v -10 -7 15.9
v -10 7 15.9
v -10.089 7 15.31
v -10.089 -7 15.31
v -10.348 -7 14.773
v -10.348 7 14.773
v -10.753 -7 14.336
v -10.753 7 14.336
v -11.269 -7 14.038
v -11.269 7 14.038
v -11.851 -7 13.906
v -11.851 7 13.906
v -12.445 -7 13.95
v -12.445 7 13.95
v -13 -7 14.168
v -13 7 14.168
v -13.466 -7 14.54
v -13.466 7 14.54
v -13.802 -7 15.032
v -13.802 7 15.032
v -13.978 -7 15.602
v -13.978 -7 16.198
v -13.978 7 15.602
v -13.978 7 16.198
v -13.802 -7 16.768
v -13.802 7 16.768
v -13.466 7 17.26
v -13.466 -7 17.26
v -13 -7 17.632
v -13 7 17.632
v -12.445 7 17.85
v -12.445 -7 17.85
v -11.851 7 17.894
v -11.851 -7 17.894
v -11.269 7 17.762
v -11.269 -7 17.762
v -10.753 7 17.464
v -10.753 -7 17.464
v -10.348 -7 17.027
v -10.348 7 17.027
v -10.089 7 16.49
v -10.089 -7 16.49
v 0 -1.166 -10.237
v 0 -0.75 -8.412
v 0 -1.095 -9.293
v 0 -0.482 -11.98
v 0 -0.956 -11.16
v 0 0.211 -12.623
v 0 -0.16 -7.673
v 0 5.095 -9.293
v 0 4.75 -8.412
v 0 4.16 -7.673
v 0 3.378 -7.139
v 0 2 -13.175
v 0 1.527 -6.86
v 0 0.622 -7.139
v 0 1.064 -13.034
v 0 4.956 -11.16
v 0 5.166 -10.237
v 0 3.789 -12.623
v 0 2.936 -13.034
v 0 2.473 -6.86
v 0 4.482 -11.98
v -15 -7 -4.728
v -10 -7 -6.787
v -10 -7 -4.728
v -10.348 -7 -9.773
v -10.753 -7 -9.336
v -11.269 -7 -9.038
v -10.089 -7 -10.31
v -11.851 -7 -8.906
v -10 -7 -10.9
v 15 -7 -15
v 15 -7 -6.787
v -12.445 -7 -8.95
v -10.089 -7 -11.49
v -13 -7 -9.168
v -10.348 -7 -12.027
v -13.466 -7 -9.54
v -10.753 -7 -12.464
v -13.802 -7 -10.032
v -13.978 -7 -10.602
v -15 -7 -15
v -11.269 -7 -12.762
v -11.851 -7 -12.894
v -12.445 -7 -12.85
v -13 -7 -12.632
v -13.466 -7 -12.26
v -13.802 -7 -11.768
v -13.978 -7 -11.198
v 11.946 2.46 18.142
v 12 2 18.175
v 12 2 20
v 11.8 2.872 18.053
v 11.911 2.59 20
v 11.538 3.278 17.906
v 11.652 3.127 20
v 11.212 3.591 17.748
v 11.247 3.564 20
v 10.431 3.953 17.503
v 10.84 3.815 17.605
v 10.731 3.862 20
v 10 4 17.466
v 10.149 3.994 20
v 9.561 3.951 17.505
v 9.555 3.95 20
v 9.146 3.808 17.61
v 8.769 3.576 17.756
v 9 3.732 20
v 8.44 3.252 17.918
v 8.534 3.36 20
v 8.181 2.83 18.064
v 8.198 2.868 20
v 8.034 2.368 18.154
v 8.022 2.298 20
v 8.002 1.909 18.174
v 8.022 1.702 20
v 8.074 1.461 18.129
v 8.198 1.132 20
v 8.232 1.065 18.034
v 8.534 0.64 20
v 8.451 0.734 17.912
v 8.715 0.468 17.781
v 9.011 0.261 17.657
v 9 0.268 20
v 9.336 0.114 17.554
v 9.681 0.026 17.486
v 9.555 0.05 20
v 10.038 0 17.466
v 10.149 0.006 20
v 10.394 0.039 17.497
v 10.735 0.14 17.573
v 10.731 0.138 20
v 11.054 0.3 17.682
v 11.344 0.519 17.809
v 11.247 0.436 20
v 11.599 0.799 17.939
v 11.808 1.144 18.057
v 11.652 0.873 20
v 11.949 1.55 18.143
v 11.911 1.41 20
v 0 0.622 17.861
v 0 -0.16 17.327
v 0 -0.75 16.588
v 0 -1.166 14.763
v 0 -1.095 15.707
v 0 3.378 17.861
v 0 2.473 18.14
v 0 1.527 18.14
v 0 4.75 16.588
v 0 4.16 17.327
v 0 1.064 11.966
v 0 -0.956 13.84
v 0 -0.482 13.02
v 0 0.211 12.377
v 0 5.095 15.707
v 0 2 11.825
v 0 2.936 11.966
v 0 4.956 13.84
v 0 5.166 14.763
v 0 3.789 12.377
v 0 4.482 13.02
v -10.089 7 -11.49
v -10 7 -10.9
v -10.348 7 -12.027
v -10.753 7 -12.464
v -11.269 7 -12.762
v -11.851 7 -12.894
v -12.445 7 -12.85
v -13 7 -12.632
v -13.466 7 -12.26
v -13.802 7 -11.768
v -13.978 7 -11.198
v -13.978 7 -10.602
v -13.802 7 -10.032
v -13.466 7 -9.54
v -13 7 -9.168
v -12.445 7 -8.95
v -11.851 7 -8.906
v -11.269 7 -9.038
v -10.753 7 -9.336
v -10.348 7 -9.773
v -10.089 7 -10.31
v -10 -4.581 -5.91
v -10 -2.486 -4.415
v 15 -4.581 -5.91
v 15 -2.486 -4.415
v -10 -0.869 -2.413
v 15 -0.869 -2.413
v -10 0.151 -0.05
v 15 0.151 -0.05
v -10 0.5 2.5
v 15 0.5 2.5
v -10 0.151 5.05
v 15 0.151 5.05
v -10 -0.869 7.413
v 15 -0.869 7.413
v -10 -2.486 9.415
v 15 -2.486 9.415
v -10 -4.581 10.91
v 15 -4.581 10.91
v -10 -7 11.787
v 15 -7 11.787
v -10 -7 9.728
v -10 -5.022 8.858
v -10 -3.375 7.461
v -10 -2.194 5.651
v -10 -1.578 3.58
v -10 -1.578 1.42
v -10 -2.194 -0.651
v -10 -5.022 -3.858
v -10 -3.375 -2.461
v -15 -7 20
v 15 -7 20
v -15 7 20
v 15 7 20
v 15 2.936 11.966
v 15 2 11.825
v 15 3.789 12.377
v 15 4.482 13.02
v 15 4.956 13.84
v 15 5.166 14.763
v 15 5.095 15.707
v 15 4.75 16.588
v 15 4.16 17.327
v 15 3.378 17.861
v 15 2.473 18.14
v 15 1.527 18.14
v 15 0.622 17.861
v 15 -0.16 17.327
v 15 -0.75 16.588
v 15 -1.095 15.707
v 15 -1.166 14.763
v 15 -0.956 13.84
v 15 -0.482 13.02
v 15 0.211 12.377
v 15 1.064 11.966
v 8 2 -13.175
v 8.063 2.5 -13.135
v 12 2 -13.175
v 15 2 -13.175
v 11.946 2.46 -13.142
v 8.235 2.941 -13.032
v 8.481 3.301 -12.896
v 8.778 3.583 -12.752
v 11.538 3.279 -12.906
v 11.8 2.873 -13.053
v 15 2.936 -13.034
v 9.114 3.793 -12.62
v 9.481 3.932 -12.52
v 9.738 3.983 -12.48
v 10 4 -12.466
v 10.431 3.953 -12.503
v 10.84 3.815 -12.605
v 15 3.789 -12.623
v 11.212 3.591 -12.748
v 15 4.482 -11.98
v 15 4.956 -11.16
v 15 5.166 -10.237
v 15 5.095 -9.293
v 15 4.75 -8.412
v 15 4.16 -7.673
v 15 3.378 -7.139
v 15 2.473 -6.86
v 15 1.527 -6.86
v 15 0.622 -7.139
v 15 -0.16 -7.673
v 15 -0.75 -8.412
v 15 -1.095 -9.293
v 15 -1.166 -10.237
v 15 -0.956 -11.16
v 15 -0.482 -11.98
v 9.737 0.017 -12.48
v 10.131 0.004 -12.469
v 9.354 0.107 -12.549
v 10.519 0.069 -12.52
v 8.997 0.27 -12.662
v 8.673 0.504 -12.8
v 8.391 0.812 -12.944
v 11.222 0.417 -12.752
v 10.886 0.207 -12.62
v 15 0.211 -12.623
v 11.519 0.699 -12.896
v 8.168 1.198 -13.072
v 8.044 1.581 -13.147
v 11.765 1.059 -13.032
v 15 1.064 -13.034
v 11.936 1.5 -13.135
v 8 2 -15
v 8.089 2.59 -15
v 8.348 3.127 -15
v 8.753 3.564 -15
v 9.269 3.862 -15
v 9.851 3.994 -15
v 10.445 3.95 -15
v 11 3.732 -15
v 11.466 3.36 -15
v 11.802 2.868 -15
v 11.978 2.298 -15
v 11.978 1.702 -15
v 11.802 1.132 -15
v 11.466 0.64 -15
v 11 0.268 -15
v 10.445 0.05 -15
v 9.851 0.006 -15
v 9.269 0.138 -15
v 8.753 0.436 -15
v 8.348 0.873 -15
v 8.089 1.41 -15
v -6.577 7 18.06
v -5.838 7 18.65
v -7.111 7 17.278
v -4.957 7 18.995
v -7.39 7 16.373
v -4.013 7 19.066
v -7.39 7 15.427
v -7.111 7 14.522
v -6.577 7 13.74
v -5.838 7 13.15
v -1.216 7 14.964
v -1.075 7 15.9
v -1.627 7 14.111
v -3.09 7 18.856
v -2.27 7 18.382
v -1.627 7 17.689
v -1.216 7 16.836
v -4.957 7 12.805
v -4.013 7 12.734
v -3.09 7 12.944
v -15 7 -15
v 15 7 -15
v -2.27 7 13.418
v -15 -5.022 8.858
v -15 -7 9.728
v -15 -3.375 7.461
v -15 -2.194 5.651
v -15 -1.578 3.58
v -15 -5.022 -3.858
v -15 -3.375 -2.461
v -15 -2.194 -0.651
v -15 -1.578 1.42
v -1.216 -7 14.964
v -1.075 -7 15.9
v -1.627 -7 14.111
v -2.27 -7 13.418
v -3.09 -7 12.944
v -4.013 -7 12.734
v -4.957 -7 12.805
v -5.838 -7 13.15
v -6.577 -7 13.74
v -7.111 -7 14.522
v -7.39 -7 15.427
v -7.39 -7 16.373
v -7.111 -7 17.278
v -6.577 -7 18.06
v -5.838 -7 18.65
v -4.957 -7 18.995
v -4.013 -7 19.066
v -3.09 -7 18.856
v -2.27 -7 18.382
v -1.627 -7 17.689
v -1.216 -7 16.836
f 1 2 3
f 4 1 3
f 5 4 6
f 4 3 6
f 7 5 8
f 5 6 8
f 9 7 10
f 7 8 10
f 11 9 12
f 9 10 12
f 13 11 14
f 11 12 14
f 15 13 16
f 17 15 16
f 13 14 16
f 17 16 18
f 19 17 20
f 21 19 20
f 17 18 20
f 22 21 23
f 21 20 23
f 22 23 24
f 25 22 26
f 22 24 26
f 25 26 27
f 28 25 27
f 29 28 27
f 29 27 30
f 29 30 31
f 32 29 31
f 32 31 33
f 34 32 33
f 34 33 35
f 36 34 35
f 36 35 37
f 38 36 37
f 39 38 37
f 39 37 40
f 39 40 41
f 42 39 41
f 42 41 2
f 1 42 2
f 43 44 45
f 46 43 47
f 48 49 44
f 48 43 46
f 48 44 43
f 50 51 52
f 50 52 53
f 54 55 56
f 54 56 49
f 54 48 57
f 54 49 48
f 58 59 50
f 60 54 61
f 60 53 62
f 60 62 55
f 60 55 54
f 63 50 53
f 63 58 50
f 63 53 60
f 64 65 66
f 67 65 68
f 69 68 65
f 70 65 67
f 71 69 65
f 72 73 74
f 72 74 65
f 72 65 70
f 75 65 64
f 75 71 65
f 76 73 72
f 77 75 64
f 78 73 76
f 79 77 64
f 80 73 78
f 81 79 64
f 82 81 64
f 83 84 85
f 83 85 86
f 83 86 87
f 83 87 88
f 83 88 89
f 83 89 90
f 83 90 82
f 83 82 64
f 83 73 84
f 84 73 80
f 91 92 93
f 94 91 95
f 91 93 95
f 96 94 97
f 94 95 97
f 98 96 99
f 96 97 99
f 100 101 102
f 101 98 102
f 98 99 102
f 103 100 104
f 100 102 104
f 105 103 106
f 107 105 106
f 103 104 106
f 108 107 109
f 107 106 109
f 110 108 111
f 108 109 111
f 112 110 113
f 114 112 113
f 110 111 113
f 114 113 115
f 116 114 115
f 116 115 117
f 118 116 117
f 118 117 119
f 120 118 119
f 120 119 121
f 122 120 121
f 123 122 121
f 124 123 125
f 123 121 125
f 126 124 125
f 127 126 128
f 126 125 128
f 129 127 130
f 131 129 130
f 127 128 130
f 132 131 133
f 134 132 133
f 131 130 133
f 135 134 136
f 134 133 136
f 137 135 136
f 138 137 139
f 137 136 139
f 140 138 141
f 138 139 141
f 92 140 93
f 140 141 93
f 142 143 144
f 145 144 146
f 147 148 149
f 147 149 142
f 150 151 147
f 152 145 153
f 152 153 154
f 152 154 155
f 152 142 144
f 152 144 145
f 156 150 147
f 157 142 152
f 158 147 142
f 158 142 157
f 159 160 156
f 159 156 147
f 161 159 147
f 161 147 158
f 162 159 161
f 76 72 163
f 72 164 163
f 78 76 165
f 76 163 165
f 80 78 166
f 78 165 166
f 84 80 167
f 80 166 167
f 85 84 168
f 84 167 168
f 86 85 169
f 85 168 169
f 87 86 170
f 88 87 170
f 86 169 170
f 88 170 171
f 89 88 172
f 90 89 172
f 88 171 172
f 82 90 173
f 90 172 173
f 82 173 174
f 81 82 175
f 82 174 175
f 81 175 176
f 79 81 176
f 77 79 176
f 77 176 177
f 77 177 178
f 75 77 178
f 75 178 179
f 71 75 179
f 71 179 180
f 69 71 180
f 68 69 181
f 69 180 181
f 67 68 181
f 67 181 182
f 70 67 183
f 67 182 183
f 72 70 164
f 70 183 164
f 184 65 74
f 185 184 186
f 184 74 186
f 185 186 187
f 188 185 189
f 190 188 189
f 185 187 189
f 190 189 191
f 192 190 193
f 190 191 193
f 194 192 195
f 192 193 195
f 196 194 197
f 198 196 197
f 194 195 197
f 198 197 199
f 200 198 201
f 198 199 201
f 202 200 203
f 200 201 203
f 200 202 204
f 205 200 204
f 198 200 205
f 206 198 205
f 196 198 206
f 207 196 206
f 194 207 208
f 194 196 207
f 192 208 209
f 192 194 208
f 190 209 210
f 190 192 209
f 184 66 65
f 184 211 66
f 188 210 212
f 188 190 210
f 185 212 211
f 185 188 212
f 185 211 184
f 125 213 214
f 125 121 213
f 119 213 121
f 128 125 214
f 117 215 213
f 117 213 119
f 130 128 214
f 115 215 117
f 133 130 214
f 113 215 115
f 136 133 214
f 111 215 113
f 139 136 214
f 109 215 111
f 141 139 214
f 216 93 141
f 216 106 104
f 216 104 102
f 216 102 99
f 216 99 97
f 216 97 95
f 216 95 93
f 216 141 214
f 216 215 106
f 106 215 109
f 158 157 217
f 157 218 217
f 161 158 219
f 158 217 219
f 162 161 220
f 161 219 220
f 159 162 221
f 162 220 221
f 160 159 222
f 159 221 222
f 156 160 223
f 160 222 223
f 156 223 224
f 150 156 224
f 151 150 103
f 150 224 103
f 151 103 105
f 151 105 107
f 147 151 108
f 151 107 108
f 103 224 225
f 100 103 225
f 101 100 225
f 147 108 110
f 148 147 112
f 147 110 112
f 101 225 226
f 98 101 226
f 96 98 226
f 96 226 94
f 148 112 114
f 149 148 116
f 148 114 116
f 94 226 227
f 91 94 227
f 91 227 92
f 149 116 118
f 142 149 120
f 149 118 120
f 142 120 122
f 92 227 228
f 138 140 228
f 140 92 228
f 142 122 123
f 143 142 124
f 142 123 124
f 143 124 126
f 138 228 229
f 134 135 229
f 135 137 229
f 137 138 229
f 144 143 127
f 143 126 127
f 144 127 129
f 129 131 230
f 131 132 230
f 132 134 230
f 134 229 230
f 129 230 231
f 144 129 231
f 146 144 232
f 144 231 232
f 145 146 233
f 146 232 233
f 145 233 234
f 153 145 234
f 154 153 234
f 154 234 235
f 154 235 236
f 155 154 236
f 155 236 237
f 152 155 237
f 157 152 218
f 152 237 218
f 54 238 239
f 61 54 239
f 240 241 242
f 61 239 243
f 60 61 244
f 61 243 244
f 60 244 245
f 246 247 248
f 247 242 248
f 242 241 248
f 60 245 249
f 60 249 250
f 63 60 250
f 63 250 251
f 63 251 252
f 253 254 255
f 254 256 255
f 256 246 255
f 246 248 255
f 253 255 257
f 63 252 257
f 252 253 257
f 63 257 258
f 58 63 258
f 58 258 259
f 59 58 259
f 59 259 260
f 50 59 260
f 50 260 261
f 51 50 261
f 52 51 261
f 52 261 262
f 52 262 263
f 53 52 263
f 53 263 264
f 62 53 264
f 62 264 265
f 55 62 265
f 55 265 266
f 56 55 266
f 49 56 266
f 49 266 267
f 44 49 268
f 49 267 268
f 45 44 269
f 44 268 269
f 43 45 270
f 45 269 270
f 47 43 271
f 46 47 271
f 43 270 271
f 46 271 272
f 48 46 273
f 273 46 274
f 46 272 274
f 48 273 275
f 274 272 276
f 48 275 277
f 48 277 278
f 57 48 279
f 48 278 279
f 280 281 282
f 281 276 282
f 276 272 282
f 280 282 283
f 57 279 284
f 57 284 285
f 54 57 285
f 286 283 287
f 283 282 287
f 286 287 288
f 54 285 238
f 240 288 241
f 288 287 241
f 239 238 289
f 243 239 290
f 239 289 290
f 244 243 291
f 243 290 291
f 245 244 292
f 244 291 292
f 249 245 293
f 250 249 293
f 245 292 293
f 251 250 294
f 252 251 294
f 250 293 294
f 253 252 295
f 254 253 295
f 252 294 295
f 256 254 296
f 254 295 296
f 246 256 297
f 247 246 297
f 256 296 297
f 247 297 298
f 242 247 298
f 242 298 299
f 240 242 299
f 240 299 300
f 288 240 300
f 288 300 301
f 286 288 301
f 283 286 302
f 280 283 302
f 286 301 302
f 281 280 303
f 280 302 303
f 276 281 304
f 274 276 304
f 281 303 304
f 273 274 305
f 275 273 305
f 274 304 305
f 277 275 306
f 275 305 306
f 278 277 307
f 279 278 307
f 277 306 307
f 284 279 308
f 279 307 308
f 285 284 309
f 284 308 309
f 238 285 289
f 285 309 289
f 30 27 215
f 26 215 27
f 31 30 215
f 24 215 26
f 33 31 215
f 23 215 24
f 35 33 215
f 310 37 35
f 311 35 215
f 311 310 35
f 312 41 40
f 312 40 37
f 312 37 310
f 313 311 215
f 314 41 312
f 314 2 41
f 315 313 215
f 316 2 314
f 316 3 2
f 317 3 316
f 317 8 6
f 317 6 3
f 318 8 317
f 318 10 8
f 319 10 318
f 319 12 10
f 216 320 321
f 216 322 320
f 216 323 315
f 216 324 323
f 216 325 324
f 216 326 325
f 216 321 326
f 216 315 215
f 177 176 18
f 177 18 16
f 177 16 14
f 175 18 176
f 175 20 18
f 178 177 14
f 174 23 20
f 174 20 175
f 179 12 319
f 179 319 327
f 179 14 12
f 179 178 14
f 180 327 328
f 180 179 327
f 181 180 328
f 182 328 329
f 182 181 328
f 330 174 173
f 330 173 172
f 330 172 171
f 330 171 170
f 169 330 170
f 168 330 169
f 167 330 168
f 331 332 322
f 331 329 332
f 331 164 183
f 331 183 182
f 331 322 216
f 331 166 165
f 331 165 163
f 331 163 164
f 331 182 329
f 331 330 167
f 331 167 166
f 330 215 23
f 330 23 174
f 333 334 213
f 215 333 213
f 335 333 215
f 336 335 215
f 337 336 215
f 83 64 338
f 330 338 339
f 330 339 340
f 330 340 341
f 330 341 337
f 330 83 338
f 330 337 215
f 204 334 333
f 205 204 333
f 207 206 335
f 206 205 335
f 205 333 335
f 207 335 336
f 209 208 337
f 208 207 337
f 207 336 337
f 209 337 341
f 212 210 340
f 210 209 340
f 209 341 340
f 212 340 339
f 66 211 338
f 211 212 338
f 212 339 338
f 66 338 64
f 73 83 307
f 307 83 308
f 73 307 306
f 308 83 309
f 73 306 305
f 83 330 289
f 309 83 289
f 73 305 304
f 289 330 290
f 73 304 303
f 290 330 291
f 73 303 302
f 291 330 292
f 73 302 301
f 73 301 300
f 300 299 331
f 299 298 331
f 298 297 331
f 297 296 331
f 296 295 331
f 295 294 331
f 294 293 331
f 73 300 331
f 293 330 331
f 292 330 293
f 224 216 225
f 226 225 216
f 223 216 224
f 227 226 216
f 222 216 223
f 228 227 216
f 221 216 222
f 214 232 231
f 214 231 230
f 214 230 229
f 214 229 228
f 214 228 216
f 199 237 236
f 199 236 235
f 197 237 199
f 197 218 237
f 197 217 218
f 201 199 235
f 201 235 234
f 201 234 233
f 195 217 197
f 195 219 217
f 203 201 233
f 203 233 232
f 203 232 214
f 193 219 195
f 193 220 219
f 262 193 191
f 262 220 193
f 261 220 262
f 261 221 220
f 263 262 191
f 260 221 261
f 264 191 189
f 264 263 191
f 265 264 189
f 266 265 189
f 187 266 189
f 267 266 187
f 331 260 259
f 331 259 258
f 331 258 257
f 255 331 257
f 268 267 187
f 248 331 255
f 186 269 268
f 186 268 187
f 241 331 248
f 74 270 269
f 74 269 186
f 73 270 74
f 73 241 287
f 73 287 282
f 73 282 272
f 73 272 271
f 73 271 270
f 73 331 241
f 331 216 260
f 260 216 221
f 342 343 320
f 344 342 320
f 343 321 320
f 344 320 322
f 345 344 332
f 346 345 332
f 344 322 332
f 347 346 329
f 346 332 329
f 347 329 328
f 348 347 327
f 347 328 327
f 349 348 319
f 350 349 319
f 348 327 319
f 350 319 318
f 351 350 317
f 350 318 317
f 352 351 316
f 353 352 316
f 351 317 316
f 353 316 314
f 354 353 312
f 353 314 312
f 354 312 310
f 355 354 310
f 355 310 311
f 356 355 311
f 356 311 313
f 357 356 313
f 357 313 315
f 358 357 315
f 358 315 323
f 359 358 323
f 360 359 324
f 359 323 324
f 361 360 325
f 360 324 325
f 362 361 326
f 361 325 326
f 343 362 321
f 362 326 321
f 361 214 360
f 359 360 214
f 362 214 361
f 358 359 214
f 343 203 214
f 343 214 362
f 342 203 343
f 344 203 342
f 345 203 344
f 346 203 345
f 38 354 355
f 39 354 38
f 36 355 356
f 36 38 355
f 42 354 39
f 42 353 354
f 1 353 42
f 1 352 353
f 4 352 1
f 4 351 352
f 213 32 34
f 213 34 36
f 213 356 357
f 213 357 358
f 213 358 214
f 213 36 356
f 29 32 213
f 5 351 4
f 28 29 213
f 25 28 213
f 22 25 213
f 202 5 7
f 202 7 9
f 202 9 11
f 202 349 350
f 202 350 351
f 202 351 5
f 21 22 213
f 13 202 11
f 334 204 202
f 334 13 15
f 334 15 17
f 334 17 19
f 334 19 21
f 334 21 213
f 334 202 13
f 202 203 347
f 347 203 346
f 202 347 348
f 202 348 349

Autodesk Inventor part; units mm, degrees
ref_plane "YZ Plane" through (0, 0, 0) normal (1, 0, 0) x (0, 1, 0)
ref_plane "XZ Plane" through (0, 0, 0) normal (0, 1, 0) x (-1, 0, 0)
ref_plane "XY Plane" through (0, 0, 0) normal (0, 0, 1) x (1, 0, 0)
sketch "Sketch1" plane through (0, 0, 0) normal (0, 0, 1) x (1, 0, 0)
  line L0 (15, -7) -> (-15, -7)
  line L1 (-15, -7) -> (-15, 7)
  line L2 (-15, 7) -> (15, 7)
  line L3 (15, 7) -> (15, -7)
  line L4 (15, -7) -> (-15, 7) construction
  line L5 (-15, -7) -> (15, 7) construction
  point P0 (0, 0)
  dimension "d0" = 30
  dimension "d1" = 14
extrude "Extrusion1" add sketch "Sketch1" along normal blind 35
sketch "Sketch3" plane through (15, -7, 0) normal (1, 0, 0) x (0, 0, -1)
  line L0 (0, 0) -> (-35, 0) projected
  line L1 (-17.5, 0) -> (-17.5, -2)
  arc A0 (-8.2129, 0) -> (-26.7871, 0) centre (-17.5, -2) ccw
  point P0 (0, 7)
  dimension "d4" = 2
  dimension "d5" = 19
extrude "Extrusion2" cut sketch "Sketch3" against normal blind 25
sketch "Sketch5" plane through (-15, 7, 0) normal (0, 1, 0) x (1, 0, 0)
  line L0 (30, 0) -> (0, 0) projected
  line L1 (30, -35) -> (0, -35) projected
  line L2 (0, -35) -> (0, -30.9)
  line L3 (0, 0) -> (0, -35) projected
  line L4 (0, -30.9) -> (2.75, -30.9)
  circle A0 centre (2.75, -30.9) radius 2
  line L5 (0, 0) -> (0, -4.1)
  line L6 (0, -4.1) -> (2.75, -4.1)
  circle A1 centre (2.75, -4.1) radius 2
  line L7 (2.75, -30.9) -> (10.75, -30.9)
  circle A2 centre (10.75, -30.9) radius 3.175
  point P0 (15, 0)
  dimension "d11" = 4.1
  dimension "d12" = 2.75
  dimension "d13" = 4
  dimension "d14" = 4.1
  dimension "d15" = 2.75
  dimension "d16" = 4
  dimension "d17" = 8
  dimension "d18" = 6.35
extrude "Extrusion3" cut sketch "Sketch5" against normal blind 100 contours A2
sketch "Sketch6" plane through (-15, 7, 0) normal (0, 1, 0) x (1, 0, 0)
  point P0 (15, 0)
sketch "Sketch7" plane through (15, -7, 0) normal (1, 0, 0) x (0, 0, -1)
  line L0 (0, 14) -> (-35, 14) projected
  line L1 (-35, 14) -> (-30, 14)
  line L2 (-30, 14) -> (-30, 9)
  line L3 (0, 14) -> (0, 0) projected
  line L4 (0, 14) -> (-5, 14)
  line L5 (-5, 14) -> (-5, 9)
  circle A0 centre (-30, 9) radius 3.175
  circle A1 centre (-5, 9) radius 3.175
  point P0 (0, 7)
  dimension "d21" = 5
  dimension "d22" = 5
  dimension "d23" = 5
  dimension "d24" = 5
  dimension "d25" = 6.35
  dimension "d26" = 6.35
extrude "Extrusion4" cut sketch "Sketch7" against normal blind 15
move or copy body "Move Body1" bodies to move or copy 1 copy no translate (-20, 0, 0)
move or copy body "Move Body2" bodies to move or copy 1 copy no translate (-5, 0, 0)
sketch "Sketch8" plane through (0, 0, 0) normal (1, 0, 0) x (0, 1, 0)
  point P0 (0, 0)
sketch "Sketch9" plane through (-40, 7, 0) normal (0, 1, 0) x (1, 0, 0)
  line L0 (30, -35) -> (0, -35) projected
  line L1 (0, -35) -> (0, -30.9)
  line L2 (0, 0) -> (0, -35) projected
  line L3 (0, -30.9) -> (3, -30.9)
  circle A0 centre (3, -30.9) radius 2
  line L4 (0, 0) -> (0, -4.1)
  line L5 (0, -4.1) -> (3, -4.1)
  circle A1 centre (3, -4.1) radius 2
  point P0 (40, 0)
  dimension "d35" = 4.1
  dimension "d36" = 3
  dimension "d37" = 4
  dimension "d38" = 4.1
  dimension "d39" = 4
  dimension "d40" = 3
extrude "Extrusion5" cut sketch "Sketch9" against normal blind 14
sketch "Sketch14" plane through (-40, 7, 35) normal (0, 0, 1) x (1, 0, 0)
  line L0 (30, 0) -> (0, 0) projected
  line L1 (30, 0) -> (25, 0)
  line L2 (25, 0) -> (25, -5)
  circle A0 centre (25, -5) radius 2
  point P0 (40, -7)
  dimension "d47" = 5
  dimension "d48" = 5
  dimension "d49" = 4
extrude "Extrusion6" cut sketch "Sketch14" against normal blind 3
sketch "Sketch15" plane through (-10, 7, 0) normal (0, 0, -1) x (-1, 0, 0)
  line L0 (0, -14) -> (0, 0) projected
  line L1 (0, 0) -> (5, 0)
  line L2 (0, 0) -> (30, 0) projected
  line L3 (5, 0) -> (5, -5)
  circle A0 centre (5, -5) radius 2
  point P0 (-10, -7)
  dimension "d52" = 5
  dimension "d53" = 5
  dimension "d54" = 4
extrude "Extrusion7" cut sketch "Sketch15" against normal blind 4
thread "Thread3" size "M4x0.7" class "6H" standard "ANSI Metric M Profile" full length
thread "Thread4" size "M4x0.7" class "6H" standard "ANSI Metric M Profile" full length
sketch "Sketch16" plane through (-40, -7, 0) normal (-1, 0, 0) x (0, 0, 1)
  line L0 (0, 14) -> (35, 14) projected
  line L1 (0, 14) -> (17.5, 14)
  line L2 (17.5, 14) -> (17.5, -2)
  circle A0 centre (17.5, -2) radius 7.5
  point P0 (0, 7)
  dimension "d61" = 16
  dimension "d62" = 15
extrude "Extrusion8" cut sketch "Sketch16" against normal blind 15
move or copy body "Move Body3" bodies to move or copy 1 copy no translate (25, 0, 0)
move or copy body "Move Body4" bodies to move or copy 1 copy no translate (10, 0, -15)
move or copy body "Move Body5" bodies to move or copy 1 copy no translate (-10, 0, 0)
sketch "Sketch17" plane through (15, -7, -15) normal (1, 0, 0) x (0, 0, -1)
  point P0 (-15, 7)
equation "\"d55\" = d54"
properties part number "Rb oven housing top-back" material "Copper"
